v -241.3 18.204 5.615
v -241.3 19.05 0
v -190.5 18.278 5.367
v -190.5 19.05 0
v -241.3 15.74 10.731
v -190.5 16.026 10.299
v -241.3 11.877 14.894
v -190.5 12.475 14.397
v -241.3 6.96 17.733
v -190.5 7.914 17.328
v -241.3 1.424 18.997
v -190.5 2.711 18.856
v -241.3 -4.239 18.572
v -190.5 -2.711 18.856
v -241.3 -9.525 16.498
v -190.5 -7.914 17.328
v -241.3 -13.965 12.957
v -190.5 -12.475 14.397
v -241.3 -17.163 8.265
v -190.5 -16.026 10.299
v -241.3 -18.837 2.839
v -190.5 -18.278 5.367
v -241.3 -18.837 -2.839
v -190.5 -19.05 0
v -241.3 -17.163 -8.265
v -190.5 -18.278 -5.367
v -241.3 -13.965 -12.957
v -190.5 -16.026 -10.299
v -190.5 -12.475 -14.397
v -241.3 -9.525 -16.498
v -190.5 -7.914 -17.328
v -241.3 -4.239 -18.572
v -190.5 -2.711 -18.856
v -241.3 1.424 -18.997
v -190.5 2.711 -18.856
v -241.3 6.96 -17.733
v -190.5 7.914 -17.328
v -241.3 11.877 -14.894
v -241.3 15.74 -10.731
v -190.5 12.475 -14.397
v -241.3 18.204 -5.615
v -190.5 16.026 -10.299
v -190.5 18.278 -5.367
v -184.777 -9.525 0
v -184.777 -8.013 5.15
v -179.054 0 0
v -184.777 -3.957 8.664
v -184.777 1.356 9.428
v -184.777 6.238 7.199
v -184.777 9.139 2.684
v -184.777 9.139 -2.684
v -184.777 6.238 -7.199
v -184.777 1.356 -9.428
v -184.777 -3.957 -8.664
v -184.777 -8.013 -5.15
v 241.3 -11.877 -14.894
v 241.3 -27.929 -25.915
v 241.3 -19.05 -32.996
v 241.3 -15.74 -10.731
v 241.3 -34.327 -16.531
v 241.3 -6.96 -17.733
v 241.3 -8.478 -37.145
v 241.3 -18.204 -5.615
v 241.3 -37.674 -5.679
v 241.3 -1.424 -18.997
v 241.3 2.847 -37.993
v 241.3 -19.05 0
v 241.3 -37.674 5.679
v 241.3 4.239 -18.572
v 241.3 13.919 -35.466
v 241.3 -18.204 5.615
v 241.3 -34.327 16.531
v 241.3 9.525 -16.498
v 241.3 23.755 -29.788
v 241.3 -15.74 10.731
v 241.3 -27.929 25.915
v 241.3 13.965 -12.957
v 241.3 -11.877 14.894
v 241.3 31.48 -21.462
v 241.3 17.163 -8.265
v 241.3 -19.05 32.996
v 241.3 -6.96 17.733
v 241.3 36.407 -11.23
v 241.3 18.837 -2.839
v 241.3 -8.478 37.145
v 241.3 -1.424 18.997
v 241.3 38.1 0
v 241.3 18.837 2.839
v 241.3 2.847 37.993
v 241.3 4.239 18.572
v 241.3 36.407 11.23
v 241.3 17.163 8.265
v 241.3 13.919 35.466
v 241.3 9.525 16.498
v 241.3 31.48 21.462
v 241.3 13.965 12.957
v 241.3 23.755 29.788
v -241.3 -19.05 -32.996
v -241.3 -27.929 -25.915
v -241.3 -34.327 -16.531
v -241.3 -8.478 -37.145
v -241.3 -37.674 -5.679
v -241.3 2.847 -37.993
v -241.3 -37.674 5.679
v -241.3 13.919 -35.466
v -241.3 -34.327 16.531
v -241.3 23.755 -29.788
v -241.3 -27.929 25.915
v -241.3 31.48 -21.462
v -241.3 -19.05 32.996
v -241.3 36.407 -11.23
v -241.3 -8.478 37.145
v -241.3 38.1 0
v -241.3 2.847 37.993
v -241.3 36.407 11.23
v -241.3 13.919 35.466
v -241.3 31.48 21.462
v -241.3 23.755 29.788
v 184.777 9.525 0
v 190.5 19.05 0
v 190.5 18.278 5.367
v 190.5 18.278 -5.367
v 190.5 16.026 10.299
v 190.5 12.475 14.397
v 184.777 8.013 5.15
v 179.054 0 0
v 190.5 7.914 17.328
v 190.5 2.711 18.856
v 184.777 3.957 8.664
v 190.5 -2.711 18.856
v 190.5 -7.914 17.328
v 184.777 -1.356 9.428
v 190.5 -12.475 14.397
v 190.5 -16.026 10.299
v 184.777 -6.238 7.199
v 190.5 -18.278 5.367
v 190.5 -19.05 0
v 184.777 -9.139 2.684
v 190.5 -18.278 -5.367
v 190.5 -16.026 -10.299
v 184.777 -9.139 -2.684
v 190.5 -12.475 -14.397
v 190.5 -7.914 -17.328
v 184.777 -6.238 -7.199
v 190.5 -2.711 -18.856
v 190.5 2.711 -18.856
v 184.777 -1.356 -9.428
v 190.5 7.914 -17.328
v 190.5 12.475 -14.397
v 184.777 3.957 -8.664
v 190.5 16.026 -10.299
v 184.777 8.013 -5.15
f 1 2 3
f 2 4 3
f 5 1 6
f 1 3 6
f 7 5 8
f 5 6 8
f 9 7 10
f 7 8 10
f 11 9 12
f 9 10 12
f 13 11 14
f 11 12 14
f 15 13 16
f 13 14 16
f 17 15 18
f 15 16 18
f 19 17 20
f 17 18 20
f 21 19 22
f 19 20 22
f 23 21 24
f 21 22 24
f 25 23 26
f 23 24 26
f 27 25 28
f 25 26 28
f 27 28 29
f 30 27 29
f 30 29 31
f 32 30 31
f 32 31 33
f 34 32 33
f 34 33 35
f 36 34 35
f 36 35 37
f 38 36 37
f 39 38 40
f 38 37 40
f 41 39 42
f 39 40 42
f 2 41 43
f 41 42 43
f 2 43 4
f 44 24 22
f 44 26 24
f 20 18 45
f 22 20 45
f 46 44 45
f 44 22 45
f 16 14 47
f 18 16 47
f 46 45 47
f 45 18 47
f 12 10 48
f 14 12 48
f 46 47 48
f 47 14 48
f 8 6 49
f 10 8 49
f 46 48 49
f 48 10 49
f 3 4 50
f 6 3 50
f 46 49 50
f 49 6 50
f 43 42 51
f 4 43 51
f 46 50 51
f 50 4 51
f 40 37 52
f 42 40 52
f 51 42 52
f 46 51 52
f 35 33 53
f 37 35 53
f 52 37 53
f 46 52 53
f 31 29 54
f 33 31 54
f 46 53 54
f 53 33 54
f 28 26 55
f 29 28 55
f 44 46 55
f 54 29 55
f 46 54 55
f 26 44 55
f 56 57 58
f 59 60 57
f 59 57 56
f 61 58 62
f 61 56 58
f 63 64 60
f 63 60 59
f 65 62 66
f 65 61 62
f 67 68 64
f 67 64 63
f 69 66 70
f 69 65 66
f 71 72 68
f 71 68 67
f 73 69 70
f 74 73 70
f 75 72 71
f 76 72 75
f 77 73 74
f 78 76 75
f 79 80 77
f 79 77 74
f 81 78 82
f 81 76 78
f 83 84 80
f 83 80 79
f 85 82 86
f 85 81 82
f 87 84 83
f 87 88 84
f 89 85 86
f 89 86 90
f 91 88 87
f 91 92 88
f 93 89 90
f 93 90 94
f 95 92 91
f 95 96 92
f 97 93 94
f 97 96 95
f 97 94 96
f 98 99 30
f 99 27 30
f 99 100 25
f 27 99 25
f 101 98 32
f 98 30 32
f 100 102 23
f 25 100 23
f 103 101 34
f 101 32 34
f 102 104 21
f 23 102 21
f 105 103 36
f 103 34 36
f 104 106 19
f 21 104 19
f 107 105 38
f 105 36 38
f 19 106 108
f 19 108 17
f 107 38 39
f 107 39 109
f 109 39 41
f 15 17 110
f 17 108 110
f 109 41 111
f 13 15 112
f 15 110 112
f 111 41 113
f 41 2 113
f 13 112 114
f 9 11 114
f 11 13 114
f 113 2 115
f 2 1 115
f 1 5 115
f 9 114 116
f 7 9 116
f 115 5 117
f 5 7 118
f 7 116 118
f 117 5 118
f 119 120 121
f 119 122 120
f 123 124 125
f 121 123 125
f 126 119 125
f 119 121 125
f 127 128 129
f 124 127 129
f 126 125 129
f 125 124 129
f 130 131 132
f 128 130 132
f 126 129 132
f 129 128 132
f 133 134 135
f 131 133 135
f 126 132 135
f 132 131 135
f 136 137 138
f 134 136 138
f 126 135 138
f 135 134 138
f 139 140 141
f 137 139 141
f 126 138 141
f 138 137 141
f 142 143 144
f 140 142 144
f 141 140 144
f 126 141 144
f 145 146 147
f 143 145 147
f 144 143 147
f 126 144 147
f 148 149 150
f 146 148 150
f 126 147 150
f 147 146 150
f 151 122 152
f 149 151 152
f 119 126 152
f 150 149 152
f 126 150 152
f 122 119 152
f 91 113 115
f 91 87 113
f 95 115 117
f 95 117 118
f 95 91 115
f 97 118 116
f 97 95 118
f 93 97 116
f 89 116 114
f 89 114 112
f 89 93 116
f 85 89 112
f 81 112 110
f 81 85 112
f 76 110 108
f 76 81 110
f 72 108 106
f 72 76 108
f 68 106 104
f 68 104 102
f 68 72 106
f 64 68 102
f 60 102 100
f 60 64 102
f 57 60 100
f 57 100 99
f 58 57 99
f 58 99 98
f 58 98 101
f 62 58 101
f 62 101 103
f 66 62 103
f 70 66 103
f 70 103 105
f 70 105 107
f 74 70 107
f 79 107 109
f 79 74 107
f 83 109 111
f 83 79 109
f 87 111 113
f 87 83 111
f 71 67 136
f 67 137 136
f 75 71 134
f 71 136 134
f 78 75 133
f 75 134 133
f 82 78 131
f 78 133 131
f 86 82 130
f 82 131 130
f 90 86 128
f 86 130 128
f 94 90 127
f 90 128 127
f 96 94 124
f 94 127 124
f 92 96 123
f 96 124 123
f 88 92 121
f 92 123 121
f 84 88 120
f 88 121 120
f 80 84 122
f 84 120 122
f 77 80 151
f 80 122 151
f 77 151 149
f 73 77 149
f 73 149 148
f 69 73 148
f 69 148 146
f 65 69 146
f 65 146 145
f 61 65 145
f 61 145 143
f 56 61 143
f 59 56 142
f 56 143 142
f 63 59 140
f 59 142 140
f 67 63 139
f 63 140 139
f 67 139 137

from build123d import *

# Parameters (mm, degrees)
F0_R     = 38.1
F1_DEPTH = 241.3
F3_D     = 38.1
F3_DEPTH = 50.8
F3_TIP   = 11.4463947925
F5_D     = 38.1
F5_DEPTH = 50.8
F5_TIP   = 11.4463947925


with BuildPart() as f1:
    # F0 (on Right) → F1 (new body, symmetric)
    with BuildSketch(Plane.YZ):
        Circle(F0_R)
    extrude(amount=F1_DEPTH, both=True)

    # F3
    with Locations(Plane(origin=(-241.3, 0, 0), x_dir=(0, -1, 0), z_dir=(-1, 0, 0))):
        with Locations((0, 0)):
            Hole(F3_D / 2, depth=F3_DEPTH)
            with Locations((0, 0, -(F3_DEPTH + F3_TIP / 2))):  # 118° drill point
                Cone(0, F3_D / 2, F3_TIP, mode=Mode.SUBTRACT)

    # F5
    with Locations(Plane.YZ.offset(241.3)):
        with Locations((0, 0)):
            Hole(F5_D / 2, depth=F5_DEPTH)
            with Locations((0, 0, -(F5_DEPTH + F5_TIP / 2))):  # 118° drill point
                Cone(0, F5_D / 2, F5_TIP, mode=Mode.SUBTRACT)


solid = f1.part
